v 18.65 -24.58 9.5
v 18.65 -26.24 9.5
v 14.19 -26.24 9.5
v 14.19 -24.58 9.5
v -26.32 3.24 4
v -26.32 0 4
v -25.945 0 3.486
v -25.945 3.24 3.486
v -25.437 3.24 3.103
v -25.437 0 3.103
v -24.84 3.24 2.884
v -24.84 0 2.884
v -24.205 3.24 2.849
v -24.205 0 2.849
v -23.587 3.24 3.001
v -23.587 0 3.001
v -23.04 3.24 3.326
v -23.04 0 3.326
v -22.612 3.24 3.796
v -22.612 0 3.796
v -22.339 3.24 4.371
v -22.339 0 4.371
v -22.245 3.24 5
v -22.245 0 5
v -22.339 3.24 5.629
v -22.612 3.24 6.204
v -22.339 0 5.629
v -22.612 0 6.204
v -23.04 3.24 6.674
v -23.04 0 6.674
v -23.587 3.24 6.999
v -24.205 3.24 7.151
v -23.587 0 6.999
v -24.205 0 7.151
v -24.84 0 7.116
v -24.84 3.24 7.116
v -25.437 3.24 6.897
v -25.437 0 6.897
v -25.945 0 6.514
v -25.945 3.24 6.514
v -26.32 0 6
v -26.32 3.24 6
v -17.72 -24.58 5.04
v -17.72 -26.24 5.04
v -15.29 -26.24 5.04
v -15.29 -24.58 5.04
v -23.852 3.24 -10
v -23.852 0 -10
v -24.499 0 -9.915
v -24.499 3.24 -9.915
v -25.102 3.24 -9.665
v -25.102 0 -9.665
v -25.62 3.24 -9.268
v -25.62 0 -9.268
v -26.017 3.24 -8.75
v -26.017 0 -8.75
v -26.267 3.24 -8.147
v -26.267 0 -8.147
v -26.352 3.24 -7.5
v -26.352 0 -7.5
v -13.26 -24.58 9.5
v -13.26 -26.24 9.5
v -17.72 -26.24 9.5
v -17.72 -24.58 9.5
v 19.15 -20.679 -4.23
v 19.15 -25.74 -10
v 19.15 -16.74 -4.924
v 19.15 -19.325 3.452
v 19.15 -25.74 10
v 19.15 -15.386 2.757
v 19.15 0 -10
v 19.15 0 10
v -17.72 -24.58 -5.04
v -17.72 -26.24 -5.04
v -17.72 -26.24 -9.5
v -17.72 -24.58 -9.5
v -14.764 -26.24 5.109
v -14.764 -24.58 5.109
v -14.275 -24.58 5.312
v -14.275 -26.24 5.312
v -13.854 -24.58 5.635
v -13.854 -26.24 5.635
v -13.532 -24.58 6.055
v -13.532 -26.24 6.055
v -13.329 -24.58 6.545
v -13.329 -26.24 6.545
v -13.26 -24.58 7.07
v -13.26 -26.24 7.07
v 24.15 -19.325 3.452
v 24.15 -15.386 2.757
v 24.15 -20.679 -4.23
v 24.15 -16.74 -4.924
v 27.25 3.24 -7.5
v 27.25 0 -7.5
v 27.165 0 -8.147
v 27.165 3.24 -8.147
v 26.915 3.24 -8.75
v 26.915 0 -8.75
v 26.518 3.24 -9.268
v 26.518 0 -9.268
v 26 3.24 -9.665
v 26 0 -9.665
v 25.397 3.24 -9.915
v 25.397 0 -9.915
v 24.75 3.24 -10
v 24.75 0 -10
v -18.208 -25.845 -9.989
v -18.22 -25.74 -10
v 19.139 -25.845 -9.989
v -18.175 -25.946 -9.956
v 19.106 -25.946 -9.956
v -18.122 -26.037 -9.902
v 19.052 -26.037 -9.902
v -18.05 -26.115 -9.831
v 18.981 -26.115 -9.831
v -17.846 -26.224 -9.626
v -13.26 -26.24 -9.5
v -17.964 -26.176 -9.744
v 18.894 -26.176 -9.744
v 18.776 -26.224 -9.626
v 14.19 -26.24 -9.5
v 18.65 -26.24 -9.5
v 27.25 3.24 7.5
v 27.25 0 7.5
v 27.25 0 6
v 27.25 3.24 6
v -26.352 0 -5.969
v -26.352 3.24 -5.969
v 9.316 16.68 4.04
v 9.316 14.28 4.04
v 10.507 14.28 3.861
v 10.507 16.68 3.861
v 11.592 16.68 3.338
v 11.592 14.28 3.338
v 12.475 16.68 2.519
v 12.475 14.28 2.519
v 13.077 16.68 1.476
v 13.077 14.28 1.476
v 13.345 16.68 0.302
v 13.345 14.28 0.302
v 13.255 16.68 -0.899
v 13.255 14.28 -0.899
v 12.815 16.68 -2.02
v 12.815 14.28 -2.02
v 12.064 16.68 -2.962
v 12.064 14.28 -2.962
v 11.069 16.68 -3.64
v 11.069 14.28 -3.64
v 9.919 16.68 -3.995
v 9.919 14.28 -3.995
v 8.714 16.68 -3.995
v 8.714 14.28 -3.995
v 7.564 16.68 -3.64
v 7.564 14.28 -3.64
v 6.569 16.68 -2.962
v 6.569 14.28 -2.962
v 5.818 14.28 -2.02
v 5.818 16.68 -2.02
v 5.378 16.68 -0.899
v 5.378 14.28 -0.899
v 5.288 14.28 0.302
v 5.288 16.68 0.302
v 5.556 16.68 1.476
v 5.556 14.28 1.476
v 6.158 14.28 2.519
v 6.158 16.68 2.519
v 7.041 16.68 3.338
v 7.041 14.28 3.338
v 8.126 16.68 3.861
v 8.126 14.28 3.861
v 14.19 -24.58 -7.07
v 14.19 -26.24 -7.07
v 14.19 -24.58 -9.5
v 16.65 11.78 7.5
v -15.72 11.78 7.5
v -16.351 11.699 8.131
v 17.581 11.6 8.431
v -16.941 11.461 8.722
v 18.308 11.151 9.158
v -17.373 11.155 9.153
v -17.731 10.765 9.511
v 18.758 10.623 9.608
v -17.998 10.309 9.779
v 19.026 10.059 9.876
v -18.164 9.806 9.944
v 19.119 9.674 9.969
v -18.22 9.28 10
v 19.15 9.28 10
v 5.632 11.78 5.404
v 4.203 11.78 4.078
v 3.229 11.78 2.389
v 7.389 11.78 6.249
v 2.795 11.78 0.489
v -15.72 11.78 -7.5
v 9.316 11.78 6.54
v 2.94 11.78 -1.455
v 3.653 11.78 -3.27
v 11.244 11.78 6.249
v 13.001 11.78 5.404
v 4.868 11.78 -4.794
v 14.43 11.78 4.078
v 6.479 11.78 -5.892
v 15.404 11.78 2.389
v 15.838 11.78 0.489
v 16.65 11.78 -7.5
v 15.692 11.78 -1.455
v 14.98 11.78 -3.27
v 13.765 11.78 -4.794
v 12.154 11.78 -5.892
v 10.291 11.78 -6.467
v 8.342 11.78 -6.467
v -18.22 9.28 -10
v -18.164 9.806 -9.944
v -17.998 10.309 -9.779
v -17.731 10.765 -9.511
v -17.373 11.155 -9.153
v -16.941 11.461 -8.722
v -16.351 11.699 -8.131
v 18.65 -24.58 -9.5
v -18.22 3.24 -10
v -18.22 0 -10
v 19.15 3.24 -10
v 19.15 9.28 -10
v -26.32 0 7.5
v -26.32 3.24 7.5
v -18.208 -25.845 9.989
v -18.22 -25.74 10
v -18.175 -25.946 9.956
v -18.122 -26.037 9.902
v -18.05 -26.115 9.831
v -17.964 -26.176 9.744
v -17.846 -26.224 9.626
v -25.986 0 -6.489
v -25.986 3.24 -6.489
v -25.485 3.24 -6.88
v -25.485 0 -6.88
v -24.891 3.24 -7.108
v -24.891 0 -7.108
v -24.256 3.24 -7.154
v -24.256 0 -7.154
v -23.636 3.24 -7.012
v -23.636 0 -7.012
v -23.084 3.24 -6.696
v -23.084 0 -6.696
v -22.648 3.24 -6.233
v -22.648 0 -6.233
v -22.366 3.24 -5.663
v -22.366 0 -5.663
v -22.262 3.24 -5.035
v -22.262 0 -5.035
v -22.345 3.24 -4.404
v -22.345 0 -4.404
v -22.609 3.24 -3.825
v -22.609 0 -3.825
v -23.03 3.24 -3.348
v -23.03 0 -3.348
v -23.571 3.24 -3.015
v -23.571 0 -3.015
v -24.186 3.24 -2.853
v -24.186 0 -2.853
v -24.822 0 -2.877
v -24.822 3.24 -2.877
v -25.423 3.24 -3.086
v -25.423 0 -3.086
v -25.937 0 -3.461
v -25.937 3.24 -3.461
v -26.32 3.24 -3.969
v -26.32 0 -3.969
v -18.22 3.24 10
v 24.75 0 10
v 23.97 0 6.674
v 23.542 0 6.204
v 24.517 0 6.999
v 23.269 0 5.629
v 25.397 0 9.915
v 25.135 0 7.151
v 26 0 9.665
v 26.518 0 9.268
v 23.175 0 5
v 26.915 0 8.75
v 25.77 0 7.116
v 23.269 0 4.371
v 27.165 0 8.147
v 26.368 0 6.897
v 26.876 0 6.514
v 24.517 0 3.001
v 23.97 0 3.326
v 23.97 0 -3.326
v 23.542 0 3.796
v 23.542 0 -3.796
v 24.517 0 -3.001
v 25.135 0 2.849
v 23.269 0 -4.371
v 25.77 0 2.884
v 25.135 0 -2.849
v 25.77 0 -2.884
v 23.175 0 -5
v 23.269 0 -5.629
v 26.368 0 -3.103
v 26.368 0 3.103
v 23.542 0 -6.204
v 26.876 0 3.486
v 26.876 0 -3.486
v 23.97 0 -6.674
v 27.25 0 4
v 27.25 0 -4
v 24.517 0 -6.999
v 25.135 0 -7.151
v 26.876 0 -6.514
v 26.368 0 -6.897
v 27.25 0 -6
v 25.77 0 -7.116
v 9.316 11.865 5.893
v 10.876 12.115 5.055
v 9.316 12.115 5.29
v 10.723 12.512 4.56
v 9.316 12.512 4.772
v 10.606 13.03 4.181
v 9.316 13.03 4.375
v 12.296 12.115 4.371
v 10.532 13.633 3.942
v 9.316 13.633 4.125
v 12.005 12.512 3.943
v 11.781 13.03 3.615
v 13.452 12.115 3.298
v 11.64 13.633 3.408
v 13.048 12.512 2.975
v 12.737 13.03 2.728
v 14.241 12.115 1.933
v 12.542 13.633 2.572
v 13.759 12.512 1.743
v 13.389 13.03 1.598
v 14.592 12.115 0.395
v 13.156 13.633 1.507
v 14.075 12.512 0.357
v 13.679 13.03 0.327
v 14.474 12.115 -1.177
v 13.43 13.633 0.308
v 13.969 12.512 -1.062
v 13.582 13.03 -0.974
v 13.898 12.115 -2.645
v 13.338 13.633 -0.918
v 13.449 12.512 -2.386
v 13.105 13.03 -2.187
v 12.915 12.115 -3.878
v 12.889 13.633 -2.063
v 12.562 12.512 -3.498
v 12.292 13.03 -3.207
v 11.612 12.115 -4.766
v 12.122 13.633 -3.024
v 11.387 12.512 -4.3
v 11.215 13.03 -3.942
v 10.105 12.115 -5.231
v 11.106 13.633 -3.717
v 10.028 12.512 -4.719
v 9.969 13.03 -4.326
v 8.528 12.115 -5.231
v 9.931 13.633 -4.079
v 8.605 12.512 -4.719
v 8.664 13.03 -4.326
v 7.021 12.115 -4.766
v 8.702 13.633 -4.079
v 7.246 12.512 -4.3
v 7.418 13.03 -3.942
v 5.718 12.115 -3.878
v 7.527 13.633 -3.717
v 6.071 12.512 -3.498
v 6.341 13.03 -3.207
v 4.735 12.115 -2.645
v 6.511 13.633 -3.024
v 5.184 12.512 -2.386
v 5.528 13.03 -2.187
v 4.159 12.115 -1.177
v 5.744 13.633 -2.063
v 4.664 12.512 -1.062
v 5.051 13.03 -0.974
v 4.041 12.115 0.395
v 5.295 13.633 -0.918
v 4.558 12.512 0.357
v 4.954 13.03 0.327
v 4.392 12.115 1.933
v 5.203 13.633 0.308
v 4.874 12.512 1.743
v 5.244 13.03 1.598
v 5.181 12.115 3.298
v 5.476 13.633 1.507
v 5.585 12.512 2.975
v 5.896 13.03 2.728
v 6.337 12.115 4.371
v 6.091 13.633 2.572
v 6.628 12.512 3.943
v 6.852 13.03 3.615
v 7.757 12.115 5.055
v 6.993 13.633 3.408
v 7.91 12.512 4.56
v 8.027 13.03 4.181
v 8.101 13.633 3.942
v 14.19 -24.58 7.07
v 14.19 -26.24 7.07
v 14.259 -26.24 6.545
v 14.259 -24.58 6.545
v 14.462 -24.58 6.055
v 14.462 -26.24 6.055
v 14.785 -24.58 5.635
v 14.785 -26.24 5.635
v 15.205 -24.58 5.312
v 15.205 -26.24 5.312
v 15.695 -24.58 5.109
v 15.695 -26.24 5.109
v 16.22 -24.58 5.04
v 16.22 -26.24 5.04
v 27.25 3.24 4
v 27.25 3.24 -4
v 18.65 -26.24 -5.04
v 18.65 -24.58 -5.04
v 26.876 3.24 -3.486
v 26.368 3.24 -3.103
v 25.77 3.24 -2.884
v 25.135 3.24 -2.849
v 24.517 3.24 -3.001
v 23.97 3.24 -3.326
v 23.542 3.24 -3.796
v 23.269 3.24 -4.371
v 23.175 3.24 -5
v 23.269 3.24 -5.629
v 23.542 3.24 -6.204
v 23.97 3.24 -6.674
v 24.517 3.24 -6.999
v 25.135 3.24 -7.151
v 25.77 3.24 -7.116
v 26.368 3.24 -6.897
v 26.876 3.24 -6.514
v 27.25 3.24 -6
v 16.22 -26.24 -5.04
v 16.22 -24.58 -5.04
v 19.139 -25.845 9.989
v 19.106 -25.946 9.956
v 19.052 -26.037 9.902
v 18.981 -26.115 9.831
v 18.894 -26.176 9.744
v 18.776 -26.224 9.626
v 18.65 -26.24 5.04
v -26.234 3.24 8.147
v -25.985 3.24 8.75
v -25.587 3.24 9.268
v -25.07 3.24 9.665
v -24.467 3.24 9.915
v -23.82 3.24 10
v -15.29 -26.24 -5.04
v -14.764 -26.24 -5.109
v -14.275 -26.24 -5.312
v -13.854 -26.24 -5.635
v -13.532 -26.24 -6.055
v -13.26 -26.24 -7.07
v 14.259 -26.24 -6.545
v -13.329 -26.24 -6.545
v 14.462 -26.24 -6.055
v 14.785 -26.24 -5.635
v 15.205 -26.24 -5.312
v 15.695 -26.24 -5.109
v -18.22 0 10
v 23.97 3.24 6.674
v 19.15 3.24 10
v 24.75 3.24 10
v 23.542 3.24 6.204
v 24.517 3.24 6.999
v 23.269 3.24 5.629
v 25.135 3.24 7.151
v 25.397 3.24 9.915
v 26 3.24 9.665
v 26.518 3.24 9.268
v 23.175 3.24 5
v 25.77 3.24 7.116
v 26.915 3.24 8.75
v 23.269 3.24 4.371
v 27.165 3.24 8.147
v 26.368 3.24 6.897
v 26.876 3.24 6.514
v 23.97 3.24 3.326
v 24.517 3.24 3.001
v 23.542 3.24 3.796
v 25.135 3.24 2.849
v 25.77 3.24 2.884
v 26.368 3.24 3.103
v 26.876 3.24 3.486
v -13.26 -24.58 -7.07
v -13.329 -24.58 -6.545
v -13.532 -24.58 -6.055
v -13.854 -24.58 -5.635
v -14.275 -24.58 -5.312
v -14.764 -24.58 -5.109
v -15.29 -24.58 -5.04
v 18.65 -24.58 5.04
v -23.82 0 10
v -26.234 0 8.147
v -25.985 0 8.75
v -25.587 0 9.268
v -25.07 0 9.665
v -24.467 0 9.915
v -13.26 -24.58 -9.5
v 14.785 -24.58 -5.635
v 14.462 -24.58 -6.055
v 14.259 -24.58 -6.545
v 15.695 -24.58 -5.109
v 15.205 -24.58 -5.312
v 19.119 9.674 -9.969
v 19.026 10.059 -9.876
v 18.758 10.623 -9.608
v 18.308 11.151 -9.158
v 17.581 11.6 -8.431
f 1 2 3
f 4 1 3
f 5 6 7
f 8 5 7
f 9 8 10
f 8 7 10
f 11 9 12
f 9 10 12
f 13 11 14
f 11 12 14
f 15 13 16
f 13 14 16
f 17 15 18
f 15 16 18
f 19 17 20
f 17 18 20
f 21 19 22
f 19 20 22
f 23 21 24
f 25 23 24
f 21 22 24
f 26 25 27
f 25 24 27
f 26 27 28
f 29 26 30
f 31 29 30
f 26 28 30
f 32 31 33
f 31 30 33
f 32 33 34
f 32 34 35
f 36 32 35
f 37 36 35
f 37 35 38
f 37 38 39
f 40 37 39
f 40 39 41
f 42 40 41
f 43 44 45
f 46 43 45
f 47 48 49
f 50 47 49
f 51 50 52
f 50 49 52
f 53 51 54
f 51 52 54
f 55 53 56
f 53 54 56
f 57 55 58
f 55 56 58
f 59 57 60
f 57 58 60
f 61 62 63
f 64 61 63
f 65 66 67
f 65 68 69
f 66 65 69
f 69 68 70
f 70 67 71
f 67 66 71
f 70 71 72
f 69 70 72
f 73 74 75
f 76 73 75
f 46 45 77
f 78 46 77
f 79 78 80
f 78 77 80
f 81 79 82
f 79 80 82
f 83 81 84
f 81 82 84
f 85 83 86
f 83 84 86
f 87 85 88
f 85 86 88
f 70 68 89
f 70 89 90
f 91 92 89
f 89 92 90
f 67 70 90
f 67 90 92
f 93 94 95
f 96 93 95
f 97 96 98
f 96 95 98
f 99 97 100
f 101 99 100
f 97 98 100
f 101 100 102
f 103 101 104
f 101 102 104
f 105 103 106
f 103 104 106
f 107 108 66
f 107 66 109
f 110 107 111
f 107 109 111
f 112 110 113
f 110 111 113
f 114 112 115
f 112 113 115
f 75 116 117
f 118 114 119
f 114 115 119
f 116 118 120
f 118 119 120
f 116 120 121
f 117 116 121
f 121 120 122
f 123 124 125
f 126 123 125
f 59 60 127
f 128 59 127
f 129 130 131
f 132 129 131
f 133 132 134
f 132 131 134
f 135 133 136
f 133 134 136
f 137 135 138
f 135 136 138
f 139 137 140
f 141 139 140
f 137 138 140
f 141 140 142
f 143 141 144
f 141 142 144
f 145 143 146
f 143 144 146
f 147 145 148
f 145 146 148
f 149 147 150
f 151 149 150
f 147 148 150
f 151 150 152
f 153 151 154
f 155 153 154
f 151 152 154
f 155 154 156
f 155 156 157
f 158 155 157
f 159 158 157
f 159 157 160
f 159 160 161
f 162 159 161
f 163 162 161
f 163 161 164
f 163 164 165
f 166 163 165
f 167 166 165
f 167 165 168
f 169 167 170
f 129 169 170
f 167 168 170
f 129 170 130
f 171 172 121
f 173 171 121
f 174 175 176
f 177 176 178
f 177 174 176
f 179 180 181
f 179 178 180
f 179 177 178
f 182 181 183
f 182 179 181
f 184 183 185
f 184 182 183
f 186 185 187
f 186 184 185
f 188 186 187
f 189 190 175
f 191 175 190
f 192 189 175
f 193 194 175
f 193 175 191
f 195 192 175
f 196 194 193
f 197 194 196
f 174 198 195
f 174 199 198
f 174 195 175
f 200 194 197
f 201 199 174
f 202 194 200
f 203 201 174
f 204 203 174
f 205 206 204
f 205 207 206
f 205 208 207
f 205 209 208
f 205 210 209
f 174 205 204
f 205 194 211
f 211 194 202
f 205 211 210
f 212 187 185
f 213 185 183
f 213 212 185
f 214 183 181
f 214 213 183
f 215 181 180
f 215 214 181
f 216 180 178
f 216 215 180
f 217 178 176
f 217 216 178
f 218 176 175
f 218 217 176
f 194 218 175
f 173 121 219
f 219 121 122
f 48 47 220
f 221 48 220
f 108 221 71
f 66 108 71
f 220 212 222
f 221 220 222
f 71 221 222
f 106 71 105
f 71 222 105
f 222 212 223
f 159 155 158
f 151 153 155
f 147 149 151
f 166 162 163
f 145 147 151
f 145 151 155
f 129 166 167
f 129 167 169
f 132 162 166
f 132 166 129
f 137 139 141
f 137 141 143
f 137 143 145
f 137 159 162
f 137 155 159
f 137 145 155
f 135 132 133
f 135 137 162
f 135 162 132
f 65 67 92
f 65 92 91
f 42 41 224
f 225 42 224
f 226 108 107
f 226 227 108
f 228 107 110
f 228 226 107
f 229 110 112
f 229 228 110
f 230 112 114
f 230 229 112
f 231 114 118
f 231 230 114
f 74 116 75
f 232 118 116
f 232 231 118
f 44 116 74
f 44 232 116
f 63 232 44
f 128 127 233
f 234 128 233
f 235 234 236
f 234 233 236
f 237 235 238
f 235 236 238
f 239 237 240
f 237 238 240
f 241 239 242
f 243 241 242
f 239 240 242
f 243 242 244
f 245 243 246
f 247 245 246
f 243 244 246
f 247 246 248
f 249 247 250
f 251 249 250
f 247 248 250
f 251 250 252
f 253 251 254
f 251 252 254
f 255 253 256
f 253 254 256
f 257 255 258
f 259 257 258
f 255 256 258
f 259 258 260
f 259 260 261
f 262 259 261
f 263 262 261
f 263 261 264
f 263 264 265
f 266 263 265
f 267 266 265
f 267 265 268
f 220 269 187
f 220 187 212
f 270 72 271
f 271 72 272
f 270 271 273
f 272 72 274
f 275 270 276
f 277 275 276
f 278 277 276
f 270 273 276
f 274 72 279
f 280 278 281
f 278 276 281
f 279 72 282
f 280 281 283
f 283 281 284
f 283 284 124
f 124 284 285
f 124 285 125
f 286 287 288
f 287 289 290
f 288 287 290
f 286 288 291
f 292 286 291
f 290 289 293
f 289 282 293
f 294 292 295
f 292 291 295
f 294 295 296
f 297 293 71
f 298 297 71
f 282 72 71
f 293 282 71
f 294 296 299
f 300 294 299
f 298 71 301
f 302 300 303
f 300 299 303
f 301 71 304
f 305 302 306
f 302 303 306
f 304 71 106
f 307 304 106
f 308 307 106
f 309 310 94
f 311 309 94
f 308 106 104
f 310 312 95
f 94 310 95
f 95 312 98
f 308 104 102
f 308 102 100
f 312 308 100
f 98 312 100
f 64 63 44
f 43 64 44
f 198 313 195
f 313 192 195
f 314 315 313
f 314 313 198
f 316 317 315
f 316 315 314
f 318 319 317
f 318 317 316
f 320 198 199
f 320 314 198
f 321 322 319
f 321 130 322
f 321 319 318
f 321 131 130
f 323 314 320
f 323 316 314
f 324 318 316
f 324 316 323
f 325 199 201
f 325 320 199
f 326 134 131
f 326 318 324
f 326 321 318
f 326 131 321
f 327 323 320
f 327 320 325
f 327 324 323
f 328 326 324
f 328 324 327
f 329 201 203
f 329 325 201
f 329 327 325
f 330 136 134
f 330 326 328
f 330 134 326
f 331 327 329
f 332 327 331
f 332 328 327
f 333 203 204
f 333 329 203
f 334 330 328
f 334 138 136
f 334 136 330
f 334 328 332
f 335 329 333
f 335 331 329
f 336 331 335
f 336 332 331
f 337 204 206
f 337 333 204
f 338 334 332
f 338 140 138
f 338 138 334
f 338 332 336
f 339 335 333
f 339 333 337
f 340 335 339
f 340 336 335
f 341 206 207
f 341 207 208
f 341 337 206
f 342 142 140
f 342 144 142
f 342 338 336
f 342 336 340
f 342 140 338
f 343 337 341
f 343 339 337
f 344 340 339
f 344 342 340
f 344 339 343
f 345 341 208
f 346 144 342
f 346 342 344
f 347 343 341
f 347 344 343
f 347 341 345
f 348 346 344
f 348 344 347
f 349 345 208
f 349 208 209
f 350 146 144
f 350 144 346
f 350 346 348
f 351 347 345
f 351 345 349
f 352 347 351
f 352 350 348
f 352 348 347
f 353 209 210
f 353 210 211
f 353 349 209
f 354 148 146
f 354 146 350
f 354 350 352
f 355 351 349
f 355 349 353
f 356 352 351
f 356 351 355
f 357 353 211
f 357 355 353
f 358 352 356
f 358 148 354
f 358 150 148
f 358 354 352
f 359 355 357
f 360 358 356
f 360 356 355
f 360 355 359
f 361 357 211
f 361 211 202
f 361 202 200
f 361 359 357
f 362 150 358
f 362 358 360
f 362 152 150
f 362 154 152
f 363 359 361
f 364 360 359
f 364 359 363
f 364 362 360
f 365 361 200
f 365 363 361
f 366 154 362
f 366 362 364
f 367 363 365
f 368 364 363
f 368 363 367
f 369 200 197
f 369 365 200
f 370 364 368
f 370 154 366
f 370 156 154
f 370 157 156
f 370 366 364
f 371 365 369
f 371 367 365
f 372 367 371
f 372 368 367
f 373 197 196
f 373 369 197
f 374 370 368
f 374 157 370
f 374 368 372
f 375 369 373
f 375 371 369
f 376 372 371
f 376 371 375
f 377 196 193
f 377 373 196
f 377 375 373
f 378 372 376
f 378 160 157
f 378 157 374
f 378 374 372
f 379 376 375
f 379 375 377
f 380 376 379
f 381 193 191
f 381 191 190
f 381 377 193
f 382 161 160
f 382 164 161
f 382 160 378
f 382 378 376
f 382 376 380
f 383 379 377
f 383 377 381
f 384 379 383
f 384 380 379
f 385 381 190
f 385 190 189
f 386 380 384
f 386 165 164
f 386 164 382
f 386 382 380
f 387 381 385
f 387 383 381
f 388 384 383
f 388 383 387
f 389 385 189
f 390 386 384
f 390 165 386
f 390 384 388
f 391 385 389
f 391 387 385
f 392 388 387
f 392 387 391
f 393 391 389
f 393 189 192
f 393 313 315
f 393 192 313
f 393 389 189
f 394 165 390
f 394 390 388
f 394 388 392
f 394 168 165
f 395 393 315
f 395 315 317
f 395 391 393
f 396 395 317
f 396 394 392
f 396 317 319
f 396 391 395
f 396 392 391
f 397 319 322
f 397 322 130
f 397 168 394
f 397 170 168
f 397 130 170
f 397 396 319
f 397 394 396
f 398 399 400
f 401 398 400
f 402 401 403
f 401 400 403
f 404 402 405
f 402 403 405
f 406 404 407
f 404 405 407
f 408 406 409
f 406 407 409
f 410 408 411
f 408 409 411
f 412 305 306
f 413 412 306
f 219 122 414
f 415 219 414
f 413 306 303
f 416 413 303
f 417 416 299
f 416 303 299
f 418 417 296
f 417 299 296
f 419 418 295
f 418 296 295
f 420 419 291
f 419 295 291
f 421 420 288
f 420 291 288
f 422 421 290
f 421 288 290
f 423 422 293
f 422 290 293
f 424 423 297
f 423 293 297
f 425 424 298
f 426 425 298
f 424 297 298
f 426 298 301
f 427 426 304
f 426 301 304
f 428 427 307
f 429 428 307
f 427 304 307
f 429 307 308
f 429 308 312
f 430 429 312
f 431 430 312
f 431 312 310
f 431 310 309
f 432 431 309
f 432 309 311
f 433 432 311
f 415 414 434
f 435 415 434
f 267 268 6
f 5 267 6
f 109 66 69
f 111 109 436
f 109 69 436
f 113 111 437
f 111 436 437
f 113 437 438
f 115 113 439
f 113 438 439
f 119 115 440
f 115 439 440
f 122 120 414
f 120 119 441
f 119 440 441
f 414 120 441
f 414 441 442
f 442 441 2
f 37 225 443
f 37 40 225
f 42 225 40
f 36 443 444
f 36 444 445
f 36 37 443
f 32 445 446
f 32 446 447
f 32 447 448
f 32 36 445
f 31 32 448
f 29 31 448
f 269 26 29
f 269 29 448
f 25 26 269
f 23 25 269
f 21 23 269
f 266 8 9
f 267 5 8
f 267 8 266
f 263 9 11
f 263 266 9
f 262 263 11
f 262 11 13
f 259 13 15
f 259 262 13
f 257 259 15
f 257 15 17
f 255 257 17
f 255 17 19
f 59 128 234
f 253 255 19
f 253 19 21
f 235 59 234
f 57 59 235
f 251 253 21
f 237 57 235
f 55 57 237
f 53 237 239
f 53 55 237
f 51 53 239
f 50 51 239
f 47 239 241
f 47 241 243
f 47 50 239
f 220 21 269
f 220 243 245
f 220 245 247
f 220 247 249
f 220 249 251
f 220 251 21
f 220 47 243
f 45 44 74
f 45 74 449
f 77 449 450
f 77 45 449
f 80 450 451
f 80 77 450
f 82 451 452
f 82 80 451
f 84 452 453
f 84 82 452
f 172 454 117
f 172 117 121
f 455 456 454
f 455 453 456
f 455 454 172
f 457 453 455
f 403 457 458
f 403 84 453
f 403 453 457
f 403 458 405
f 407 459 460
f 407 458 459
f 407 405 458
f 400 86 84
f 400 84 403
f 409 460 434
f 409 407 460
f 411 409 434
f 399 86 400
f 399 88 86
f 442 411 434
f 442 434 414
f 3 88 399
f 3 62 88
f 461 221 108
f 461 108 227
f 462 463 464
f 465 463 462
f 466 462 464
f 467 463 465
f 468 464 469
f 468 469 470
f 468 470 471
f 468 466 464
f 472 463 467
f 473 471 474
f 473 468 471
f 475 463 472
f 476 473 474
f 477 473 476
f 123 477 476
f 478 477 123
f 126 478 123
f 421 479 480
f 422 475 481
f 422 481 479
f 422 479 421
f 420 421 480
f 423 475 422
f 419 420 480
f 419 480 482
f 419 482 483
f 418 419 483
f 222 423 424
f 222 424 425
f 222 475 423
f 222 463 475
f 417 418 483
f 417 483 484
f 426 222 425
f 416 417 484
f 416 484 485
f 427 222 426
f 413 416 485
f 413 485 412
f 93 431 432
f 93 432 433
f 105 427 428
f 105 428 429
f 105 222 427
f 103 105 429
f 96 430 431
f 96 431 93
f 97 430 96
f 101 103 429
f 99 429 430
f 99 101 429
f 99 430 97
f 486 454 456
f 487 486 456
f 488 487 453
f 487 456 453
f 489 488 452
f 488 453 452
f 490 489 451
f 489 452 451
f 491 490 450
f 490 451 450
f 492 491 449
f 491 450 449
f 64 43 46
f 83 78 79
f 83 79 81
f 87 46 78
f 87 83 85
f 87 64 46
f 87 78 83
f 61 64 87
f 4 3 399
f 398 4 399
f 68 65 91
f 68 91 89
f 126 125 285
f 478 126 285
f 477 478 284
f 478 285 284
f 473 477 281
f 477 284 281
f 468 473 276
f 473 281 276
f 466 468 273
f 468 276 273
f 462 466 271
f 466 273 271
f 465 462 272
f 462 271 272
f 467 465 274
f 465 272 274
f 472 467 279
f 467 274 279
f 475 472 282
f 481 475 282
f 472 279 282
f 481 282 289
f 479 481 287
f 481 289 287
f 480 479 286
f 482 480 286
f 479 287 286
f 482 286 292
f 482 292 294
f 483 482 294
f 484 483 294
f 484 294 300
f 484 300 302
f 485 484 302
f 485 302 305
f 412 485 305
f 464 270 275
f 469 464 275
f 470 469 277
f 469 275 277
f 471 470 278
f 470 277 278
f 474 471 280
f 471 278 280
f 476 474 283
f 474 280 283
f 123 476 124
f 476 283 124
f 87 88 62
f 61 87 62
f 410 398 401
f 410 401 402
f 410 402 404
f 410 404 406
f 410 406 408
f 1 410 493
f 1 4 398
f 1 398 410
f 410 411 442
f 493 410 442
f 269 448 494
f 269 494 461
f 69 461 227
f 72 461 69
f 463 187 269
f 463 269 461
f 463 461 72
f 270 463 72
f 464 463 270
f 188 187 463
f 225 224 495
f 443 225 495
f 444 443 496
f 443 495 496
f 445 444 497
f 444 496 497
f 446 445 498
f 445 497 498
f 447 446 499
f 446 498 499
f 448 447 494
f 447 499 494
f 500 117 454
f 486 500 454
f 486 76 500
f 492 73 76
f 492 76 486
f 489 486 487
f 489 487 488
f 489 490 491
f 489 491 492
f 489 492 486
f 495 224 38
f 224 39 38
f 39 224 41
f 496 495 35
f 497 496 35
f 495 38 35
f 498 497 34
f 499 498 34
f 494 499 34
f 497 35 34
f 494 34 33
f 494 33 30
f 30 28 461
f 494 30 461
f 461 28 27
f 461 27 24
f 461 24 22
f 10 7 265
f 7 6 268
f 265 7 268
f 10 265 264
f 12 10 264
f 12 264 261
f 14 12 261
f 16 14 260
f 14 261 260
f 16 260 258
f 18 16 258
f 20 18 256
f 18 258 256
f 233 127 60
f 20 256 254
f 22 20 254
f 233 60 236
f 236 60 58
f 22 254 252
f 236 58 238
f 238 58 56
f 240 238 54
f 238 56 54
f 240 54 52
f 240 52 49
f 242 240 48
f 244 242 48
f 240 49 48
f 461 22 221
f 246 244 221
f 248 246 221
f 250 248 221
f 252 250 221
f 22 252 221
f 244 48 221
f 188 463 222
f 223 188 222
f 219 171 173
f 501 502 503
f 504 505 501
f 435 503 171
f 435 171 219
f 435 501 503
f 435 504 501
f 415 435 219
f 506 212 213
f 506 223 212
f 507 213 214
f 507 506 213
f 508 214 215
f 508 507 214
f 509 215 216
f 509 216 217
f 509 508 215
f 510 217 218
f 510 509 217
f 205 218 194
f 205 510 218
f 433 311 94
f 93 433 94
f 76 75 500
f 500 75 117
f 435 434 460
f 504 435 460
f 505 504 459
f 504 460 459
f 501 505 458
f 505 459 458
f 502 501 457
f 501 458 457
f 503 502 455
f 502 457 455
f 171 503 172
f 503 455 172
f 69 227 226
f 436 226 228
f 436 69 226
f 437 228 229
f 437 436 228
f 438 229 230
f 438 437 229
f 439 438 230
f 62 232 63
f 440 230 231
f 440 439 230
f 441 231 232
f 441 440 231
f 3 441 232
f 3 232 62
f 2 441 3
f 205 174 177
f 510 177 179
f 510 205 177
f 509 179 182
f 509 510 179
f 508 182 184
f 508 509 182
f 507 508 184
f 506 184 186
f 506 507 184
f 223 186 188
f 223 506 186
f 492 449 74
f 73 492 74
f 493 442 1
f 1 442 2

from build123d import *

# Parameters (mm, degrees)
BOSS_EXTRUDE2_DEPTH   = 3.24
BOSS_EXTRUDE2_2_DEPTH = 3.24
SKETCH1_5_W           = 37.369599927
SKETCH1_5_H           = 20
BOSS_EXTRUDE3_DEPTH   = 11.78
SKETCH2_R             = 4.04
BOSS_EXTRUDE4_DEPTH   = 4.9
FILLET5_R             = 2.5
SKETCH1_6_W           = 37.369599927
SKETCH1_6_H           = 20
BOSS_EXTRUDE8_DEPTH   = 16.74
BOSS_EXTRUDE9_DEPTH   = 5
SKETCH7_W             = 37.369599927
SKETCH7_H             = 20
BOSS_EXTRUDE10_DEPTH  = 9.5
FILLET6_R             = 0.5
CUT_EXTRUDE2_DEPTH    = 1.66


with BuildPart() as part:
    # Sketch1 → Boss-Extrude2 (new body)
    with BuildSketch(Plane(origin=(0, 0, 0), x_dir=(1, 0, 0), z_dir=(0, 1, 0))):
        with BuildLine():
            ThreePointArc((27.25, 4), (23.175424329, 5), (27.25, 6))
            Line((27.25, 6), (27.25, 7.5))
            ThreePointArc((27.25, 7.5), (26.517766953, 9.267766953), (24.75, 10))
            Line((24.75, 10), (19.15, 10))
            Line((19.15, 10), (19.15, -10))
            Line((19.15, -10), (24.75, -10))
            ThreePointArc((24.75, -10), (26.517766953, -9.267766953), (27.25, -7.5))
            Line((27.25, -7.5), (27.25, -6))
            ThreePointArc((27.25, -6), (23.175424329, -5), (27.25, -4))
            Line((27.25, -4), (27.25, 4))
        make_face()
    extrude(amount=BOSS_EXTRUDE2_DEPTH)



with BuildPart() as body_2:
    # Sketch1 → Boss-Extrude2 2 (new body)
    with BuildSketch(Plane(origin=(0, 0, 0), x_dir=(1, 0, 0), z_dir=(0, 1, 0))):
        with BuildLine():
            Line((-18.219599927, -10), (-18.219599927, 10))
            Line((-18.219599927, 10), (-23.852132603, 10))
            ThreePointArc((-23.852132603, 10), (-25.619899556, 9.267766953), (-26.352132603, 7.5))
            Line((-26.352132603, 7.5), (-26.352132603, 5.968724559))
            ThreePointArc((-26.352132603, 5.968724559), (-22.261829683, 5.035135291), (-26.319599927, 3.96898917))
            Line((-26.319599927, 3.96898917), (-26.319599927, -4))
            ThreePointArc((-26.319599927, -4), (-22.245024256, -5), (-26.319599927, -6))
            Line((-26.319599927, -6), (-26.319599927, -7.5))
            ThreePointArc((-26.319599927, -7.5), (-25.58736688, -9.267766953), (-23.819599927, -10))
            Line((-23.819599927, -10), (-18.219599927, -10))
        make_face()
    extrude(amount=BOSS_EXTRUDE2_2_DEPTH)


with BuildPart() as part_1:
    add(part.part)

    add(body_2.part)  # Boss-Extrude3 merges body 2
    # Sketch1<5> → Boss-Extrude3 (add)
    with BuildSketch(Plane(origin=(0, 0, 0), x_dir=(1, 0, 0), z_dir=(0, 1, 0))):
        with Locations((0.465200037, 0)):
            Rectangle(SKETCH1_5_W, SKETCH1_5_H)
    extrude(amount=BOSS_EXTRUDE3_DEPTH)

    # Sketch2 → Boss-Extrude4 (add)
    with BuildSketch(Plane(origin=(0, 11.78, 0), x_dir=(1, 0, 0), z_dir=(0, 1, 0))):
        with Locations((9.316469078, 0)):
            Circle(SKETCH2_R)
    extrude(amount=BOSS_EXTRUDE4_DEPTH)

    # Fillet5
    fillet5_edges = [part_1.edges().sort_by_distance(p)[0] for p in [
        (0.465200037, 11.78, 10),
        (-18.219599927, 11.78, 0),
        (0.465200037, 11.78, -10),
        (19.15, 11.78, 0),
        (5.276469078, 11.78, 0),
    ]]
    fillet(fillet5_edges, radius=FILLET5_R)

    # Sketch1<6> → Boss-Extrude8 (add)
    with BuildSketch(Plane(origin=(0, 0, 0), x_dir=(1, 0, 0), z_dir=(0, 1, 0))):
        with Locations((0.465200037, 0)):
            Rectangle(SKETCH1_6_W, SKETCH1_6_H)
    extrude(amount=-BOSS_EXTRUDE8_DEPTH)

    # Sketch6 → Boss-Extrude9 (add)
    with BuildSketch(Plane(origin=(19.15, 0, 0), x_dir=(0, 0, -1), z_dir=(1, 0, 0))):
        Polygon((-2.757398298, -15.385544214), (4.924102175, -16.74), (4.229509465, -20.679231012), (-3.451991009, -19.324775226), align=None)
    extrude(amount=BOSS_EXTRUDE9_DEPTH)

    # Sketch7 → Boss-Extrude10 (add)
    with BuildSketch(Plane.XZ.offset(16.74)):
        with Locations((0.465200037, 0)):
            Rectangle(SKETCH7_W, SKETCH7_H)
    extrude(amount=BOSS_EXTRUDE10_DEPTH)

    # Fillet6
    fillet6_edges = [part_1.edges().sort_by_distance(p)[0] for p in [
        (0.465200037, -26.24, 10),
        (19.15, -26.24, 0),
        (0.465200037, -26.24, -10),
        (-18.219599927, -26.24, 0),
    ]]
    fillet(fillet6_edges, radius=FILLET6_R)

    # Sketch8 → Cut-Extrude2 (cut)
    with BuildSketch(Plane.XZ.offset(26.24)):
        with BuildLine():
            Line((14.19, 9.5), (14.19, 7.07))
            ThreePointArc((14.19, 7.07), (14.784573234, 5.634573234), (16.22, 5.04))
            Line((16.22, 5.04), (18.65, 5.04))
            Line((18.65, 5.04), (18.65, 9.5))
            Line((18.65, 9.5), (14.19, 9.5))
        make_face()
        with BuildLine():
            Line((-13.259599927, 7.07), (-13.259599927, 9.5))
            Line((-13.259599927, 9.5), (-17.719599927, 9.5))
            Line((-17.719599927, 9.5), (-17.719599927, 5.04))
            Line((-17.719599927, 5.04), (-15.289599927, 5.04))
            ThreePointArc((-15.289599927, 5.04), (-13.854173161, 5.634573234), (-13.259599927, 7.07))
        make_face()
        with BuildLine():
            Line((18.65, -9.5), (18.65, -5.04))
            Line((18.65, -5.04), (16.22, -5.04))
            ThreePointArc((16.22, -5.04), (14.784573234, -5.634573234), (14.19, -7.07))
            Line((14.19, -7.07), (14.19, -9.5))
            Line((14.19, -9.5), (18.65, -9.5))
        make_face()
        with BuildLine():
            Line((-15.289599927, -5.04), (-17.719599927, -5.04))
            Line((-17.719599927, -5.04), (-17.719599927, -9.5))
            Line((-17.719599927, -9.5), (-13.259599927, -9.5))
            Line((-13.259599927, -9.5), (-13.259599927, -7.07))
            ThreePointArc((-13.259599927, -7.07), (-13.854173161, -5.634573234), (-15.289599927, -5.04))
        make_face()
    extrude(amount=-CUT_EXTRUDE2_DEPTH, mode=Mode.SUBTRACT)


solid = part_1.part
